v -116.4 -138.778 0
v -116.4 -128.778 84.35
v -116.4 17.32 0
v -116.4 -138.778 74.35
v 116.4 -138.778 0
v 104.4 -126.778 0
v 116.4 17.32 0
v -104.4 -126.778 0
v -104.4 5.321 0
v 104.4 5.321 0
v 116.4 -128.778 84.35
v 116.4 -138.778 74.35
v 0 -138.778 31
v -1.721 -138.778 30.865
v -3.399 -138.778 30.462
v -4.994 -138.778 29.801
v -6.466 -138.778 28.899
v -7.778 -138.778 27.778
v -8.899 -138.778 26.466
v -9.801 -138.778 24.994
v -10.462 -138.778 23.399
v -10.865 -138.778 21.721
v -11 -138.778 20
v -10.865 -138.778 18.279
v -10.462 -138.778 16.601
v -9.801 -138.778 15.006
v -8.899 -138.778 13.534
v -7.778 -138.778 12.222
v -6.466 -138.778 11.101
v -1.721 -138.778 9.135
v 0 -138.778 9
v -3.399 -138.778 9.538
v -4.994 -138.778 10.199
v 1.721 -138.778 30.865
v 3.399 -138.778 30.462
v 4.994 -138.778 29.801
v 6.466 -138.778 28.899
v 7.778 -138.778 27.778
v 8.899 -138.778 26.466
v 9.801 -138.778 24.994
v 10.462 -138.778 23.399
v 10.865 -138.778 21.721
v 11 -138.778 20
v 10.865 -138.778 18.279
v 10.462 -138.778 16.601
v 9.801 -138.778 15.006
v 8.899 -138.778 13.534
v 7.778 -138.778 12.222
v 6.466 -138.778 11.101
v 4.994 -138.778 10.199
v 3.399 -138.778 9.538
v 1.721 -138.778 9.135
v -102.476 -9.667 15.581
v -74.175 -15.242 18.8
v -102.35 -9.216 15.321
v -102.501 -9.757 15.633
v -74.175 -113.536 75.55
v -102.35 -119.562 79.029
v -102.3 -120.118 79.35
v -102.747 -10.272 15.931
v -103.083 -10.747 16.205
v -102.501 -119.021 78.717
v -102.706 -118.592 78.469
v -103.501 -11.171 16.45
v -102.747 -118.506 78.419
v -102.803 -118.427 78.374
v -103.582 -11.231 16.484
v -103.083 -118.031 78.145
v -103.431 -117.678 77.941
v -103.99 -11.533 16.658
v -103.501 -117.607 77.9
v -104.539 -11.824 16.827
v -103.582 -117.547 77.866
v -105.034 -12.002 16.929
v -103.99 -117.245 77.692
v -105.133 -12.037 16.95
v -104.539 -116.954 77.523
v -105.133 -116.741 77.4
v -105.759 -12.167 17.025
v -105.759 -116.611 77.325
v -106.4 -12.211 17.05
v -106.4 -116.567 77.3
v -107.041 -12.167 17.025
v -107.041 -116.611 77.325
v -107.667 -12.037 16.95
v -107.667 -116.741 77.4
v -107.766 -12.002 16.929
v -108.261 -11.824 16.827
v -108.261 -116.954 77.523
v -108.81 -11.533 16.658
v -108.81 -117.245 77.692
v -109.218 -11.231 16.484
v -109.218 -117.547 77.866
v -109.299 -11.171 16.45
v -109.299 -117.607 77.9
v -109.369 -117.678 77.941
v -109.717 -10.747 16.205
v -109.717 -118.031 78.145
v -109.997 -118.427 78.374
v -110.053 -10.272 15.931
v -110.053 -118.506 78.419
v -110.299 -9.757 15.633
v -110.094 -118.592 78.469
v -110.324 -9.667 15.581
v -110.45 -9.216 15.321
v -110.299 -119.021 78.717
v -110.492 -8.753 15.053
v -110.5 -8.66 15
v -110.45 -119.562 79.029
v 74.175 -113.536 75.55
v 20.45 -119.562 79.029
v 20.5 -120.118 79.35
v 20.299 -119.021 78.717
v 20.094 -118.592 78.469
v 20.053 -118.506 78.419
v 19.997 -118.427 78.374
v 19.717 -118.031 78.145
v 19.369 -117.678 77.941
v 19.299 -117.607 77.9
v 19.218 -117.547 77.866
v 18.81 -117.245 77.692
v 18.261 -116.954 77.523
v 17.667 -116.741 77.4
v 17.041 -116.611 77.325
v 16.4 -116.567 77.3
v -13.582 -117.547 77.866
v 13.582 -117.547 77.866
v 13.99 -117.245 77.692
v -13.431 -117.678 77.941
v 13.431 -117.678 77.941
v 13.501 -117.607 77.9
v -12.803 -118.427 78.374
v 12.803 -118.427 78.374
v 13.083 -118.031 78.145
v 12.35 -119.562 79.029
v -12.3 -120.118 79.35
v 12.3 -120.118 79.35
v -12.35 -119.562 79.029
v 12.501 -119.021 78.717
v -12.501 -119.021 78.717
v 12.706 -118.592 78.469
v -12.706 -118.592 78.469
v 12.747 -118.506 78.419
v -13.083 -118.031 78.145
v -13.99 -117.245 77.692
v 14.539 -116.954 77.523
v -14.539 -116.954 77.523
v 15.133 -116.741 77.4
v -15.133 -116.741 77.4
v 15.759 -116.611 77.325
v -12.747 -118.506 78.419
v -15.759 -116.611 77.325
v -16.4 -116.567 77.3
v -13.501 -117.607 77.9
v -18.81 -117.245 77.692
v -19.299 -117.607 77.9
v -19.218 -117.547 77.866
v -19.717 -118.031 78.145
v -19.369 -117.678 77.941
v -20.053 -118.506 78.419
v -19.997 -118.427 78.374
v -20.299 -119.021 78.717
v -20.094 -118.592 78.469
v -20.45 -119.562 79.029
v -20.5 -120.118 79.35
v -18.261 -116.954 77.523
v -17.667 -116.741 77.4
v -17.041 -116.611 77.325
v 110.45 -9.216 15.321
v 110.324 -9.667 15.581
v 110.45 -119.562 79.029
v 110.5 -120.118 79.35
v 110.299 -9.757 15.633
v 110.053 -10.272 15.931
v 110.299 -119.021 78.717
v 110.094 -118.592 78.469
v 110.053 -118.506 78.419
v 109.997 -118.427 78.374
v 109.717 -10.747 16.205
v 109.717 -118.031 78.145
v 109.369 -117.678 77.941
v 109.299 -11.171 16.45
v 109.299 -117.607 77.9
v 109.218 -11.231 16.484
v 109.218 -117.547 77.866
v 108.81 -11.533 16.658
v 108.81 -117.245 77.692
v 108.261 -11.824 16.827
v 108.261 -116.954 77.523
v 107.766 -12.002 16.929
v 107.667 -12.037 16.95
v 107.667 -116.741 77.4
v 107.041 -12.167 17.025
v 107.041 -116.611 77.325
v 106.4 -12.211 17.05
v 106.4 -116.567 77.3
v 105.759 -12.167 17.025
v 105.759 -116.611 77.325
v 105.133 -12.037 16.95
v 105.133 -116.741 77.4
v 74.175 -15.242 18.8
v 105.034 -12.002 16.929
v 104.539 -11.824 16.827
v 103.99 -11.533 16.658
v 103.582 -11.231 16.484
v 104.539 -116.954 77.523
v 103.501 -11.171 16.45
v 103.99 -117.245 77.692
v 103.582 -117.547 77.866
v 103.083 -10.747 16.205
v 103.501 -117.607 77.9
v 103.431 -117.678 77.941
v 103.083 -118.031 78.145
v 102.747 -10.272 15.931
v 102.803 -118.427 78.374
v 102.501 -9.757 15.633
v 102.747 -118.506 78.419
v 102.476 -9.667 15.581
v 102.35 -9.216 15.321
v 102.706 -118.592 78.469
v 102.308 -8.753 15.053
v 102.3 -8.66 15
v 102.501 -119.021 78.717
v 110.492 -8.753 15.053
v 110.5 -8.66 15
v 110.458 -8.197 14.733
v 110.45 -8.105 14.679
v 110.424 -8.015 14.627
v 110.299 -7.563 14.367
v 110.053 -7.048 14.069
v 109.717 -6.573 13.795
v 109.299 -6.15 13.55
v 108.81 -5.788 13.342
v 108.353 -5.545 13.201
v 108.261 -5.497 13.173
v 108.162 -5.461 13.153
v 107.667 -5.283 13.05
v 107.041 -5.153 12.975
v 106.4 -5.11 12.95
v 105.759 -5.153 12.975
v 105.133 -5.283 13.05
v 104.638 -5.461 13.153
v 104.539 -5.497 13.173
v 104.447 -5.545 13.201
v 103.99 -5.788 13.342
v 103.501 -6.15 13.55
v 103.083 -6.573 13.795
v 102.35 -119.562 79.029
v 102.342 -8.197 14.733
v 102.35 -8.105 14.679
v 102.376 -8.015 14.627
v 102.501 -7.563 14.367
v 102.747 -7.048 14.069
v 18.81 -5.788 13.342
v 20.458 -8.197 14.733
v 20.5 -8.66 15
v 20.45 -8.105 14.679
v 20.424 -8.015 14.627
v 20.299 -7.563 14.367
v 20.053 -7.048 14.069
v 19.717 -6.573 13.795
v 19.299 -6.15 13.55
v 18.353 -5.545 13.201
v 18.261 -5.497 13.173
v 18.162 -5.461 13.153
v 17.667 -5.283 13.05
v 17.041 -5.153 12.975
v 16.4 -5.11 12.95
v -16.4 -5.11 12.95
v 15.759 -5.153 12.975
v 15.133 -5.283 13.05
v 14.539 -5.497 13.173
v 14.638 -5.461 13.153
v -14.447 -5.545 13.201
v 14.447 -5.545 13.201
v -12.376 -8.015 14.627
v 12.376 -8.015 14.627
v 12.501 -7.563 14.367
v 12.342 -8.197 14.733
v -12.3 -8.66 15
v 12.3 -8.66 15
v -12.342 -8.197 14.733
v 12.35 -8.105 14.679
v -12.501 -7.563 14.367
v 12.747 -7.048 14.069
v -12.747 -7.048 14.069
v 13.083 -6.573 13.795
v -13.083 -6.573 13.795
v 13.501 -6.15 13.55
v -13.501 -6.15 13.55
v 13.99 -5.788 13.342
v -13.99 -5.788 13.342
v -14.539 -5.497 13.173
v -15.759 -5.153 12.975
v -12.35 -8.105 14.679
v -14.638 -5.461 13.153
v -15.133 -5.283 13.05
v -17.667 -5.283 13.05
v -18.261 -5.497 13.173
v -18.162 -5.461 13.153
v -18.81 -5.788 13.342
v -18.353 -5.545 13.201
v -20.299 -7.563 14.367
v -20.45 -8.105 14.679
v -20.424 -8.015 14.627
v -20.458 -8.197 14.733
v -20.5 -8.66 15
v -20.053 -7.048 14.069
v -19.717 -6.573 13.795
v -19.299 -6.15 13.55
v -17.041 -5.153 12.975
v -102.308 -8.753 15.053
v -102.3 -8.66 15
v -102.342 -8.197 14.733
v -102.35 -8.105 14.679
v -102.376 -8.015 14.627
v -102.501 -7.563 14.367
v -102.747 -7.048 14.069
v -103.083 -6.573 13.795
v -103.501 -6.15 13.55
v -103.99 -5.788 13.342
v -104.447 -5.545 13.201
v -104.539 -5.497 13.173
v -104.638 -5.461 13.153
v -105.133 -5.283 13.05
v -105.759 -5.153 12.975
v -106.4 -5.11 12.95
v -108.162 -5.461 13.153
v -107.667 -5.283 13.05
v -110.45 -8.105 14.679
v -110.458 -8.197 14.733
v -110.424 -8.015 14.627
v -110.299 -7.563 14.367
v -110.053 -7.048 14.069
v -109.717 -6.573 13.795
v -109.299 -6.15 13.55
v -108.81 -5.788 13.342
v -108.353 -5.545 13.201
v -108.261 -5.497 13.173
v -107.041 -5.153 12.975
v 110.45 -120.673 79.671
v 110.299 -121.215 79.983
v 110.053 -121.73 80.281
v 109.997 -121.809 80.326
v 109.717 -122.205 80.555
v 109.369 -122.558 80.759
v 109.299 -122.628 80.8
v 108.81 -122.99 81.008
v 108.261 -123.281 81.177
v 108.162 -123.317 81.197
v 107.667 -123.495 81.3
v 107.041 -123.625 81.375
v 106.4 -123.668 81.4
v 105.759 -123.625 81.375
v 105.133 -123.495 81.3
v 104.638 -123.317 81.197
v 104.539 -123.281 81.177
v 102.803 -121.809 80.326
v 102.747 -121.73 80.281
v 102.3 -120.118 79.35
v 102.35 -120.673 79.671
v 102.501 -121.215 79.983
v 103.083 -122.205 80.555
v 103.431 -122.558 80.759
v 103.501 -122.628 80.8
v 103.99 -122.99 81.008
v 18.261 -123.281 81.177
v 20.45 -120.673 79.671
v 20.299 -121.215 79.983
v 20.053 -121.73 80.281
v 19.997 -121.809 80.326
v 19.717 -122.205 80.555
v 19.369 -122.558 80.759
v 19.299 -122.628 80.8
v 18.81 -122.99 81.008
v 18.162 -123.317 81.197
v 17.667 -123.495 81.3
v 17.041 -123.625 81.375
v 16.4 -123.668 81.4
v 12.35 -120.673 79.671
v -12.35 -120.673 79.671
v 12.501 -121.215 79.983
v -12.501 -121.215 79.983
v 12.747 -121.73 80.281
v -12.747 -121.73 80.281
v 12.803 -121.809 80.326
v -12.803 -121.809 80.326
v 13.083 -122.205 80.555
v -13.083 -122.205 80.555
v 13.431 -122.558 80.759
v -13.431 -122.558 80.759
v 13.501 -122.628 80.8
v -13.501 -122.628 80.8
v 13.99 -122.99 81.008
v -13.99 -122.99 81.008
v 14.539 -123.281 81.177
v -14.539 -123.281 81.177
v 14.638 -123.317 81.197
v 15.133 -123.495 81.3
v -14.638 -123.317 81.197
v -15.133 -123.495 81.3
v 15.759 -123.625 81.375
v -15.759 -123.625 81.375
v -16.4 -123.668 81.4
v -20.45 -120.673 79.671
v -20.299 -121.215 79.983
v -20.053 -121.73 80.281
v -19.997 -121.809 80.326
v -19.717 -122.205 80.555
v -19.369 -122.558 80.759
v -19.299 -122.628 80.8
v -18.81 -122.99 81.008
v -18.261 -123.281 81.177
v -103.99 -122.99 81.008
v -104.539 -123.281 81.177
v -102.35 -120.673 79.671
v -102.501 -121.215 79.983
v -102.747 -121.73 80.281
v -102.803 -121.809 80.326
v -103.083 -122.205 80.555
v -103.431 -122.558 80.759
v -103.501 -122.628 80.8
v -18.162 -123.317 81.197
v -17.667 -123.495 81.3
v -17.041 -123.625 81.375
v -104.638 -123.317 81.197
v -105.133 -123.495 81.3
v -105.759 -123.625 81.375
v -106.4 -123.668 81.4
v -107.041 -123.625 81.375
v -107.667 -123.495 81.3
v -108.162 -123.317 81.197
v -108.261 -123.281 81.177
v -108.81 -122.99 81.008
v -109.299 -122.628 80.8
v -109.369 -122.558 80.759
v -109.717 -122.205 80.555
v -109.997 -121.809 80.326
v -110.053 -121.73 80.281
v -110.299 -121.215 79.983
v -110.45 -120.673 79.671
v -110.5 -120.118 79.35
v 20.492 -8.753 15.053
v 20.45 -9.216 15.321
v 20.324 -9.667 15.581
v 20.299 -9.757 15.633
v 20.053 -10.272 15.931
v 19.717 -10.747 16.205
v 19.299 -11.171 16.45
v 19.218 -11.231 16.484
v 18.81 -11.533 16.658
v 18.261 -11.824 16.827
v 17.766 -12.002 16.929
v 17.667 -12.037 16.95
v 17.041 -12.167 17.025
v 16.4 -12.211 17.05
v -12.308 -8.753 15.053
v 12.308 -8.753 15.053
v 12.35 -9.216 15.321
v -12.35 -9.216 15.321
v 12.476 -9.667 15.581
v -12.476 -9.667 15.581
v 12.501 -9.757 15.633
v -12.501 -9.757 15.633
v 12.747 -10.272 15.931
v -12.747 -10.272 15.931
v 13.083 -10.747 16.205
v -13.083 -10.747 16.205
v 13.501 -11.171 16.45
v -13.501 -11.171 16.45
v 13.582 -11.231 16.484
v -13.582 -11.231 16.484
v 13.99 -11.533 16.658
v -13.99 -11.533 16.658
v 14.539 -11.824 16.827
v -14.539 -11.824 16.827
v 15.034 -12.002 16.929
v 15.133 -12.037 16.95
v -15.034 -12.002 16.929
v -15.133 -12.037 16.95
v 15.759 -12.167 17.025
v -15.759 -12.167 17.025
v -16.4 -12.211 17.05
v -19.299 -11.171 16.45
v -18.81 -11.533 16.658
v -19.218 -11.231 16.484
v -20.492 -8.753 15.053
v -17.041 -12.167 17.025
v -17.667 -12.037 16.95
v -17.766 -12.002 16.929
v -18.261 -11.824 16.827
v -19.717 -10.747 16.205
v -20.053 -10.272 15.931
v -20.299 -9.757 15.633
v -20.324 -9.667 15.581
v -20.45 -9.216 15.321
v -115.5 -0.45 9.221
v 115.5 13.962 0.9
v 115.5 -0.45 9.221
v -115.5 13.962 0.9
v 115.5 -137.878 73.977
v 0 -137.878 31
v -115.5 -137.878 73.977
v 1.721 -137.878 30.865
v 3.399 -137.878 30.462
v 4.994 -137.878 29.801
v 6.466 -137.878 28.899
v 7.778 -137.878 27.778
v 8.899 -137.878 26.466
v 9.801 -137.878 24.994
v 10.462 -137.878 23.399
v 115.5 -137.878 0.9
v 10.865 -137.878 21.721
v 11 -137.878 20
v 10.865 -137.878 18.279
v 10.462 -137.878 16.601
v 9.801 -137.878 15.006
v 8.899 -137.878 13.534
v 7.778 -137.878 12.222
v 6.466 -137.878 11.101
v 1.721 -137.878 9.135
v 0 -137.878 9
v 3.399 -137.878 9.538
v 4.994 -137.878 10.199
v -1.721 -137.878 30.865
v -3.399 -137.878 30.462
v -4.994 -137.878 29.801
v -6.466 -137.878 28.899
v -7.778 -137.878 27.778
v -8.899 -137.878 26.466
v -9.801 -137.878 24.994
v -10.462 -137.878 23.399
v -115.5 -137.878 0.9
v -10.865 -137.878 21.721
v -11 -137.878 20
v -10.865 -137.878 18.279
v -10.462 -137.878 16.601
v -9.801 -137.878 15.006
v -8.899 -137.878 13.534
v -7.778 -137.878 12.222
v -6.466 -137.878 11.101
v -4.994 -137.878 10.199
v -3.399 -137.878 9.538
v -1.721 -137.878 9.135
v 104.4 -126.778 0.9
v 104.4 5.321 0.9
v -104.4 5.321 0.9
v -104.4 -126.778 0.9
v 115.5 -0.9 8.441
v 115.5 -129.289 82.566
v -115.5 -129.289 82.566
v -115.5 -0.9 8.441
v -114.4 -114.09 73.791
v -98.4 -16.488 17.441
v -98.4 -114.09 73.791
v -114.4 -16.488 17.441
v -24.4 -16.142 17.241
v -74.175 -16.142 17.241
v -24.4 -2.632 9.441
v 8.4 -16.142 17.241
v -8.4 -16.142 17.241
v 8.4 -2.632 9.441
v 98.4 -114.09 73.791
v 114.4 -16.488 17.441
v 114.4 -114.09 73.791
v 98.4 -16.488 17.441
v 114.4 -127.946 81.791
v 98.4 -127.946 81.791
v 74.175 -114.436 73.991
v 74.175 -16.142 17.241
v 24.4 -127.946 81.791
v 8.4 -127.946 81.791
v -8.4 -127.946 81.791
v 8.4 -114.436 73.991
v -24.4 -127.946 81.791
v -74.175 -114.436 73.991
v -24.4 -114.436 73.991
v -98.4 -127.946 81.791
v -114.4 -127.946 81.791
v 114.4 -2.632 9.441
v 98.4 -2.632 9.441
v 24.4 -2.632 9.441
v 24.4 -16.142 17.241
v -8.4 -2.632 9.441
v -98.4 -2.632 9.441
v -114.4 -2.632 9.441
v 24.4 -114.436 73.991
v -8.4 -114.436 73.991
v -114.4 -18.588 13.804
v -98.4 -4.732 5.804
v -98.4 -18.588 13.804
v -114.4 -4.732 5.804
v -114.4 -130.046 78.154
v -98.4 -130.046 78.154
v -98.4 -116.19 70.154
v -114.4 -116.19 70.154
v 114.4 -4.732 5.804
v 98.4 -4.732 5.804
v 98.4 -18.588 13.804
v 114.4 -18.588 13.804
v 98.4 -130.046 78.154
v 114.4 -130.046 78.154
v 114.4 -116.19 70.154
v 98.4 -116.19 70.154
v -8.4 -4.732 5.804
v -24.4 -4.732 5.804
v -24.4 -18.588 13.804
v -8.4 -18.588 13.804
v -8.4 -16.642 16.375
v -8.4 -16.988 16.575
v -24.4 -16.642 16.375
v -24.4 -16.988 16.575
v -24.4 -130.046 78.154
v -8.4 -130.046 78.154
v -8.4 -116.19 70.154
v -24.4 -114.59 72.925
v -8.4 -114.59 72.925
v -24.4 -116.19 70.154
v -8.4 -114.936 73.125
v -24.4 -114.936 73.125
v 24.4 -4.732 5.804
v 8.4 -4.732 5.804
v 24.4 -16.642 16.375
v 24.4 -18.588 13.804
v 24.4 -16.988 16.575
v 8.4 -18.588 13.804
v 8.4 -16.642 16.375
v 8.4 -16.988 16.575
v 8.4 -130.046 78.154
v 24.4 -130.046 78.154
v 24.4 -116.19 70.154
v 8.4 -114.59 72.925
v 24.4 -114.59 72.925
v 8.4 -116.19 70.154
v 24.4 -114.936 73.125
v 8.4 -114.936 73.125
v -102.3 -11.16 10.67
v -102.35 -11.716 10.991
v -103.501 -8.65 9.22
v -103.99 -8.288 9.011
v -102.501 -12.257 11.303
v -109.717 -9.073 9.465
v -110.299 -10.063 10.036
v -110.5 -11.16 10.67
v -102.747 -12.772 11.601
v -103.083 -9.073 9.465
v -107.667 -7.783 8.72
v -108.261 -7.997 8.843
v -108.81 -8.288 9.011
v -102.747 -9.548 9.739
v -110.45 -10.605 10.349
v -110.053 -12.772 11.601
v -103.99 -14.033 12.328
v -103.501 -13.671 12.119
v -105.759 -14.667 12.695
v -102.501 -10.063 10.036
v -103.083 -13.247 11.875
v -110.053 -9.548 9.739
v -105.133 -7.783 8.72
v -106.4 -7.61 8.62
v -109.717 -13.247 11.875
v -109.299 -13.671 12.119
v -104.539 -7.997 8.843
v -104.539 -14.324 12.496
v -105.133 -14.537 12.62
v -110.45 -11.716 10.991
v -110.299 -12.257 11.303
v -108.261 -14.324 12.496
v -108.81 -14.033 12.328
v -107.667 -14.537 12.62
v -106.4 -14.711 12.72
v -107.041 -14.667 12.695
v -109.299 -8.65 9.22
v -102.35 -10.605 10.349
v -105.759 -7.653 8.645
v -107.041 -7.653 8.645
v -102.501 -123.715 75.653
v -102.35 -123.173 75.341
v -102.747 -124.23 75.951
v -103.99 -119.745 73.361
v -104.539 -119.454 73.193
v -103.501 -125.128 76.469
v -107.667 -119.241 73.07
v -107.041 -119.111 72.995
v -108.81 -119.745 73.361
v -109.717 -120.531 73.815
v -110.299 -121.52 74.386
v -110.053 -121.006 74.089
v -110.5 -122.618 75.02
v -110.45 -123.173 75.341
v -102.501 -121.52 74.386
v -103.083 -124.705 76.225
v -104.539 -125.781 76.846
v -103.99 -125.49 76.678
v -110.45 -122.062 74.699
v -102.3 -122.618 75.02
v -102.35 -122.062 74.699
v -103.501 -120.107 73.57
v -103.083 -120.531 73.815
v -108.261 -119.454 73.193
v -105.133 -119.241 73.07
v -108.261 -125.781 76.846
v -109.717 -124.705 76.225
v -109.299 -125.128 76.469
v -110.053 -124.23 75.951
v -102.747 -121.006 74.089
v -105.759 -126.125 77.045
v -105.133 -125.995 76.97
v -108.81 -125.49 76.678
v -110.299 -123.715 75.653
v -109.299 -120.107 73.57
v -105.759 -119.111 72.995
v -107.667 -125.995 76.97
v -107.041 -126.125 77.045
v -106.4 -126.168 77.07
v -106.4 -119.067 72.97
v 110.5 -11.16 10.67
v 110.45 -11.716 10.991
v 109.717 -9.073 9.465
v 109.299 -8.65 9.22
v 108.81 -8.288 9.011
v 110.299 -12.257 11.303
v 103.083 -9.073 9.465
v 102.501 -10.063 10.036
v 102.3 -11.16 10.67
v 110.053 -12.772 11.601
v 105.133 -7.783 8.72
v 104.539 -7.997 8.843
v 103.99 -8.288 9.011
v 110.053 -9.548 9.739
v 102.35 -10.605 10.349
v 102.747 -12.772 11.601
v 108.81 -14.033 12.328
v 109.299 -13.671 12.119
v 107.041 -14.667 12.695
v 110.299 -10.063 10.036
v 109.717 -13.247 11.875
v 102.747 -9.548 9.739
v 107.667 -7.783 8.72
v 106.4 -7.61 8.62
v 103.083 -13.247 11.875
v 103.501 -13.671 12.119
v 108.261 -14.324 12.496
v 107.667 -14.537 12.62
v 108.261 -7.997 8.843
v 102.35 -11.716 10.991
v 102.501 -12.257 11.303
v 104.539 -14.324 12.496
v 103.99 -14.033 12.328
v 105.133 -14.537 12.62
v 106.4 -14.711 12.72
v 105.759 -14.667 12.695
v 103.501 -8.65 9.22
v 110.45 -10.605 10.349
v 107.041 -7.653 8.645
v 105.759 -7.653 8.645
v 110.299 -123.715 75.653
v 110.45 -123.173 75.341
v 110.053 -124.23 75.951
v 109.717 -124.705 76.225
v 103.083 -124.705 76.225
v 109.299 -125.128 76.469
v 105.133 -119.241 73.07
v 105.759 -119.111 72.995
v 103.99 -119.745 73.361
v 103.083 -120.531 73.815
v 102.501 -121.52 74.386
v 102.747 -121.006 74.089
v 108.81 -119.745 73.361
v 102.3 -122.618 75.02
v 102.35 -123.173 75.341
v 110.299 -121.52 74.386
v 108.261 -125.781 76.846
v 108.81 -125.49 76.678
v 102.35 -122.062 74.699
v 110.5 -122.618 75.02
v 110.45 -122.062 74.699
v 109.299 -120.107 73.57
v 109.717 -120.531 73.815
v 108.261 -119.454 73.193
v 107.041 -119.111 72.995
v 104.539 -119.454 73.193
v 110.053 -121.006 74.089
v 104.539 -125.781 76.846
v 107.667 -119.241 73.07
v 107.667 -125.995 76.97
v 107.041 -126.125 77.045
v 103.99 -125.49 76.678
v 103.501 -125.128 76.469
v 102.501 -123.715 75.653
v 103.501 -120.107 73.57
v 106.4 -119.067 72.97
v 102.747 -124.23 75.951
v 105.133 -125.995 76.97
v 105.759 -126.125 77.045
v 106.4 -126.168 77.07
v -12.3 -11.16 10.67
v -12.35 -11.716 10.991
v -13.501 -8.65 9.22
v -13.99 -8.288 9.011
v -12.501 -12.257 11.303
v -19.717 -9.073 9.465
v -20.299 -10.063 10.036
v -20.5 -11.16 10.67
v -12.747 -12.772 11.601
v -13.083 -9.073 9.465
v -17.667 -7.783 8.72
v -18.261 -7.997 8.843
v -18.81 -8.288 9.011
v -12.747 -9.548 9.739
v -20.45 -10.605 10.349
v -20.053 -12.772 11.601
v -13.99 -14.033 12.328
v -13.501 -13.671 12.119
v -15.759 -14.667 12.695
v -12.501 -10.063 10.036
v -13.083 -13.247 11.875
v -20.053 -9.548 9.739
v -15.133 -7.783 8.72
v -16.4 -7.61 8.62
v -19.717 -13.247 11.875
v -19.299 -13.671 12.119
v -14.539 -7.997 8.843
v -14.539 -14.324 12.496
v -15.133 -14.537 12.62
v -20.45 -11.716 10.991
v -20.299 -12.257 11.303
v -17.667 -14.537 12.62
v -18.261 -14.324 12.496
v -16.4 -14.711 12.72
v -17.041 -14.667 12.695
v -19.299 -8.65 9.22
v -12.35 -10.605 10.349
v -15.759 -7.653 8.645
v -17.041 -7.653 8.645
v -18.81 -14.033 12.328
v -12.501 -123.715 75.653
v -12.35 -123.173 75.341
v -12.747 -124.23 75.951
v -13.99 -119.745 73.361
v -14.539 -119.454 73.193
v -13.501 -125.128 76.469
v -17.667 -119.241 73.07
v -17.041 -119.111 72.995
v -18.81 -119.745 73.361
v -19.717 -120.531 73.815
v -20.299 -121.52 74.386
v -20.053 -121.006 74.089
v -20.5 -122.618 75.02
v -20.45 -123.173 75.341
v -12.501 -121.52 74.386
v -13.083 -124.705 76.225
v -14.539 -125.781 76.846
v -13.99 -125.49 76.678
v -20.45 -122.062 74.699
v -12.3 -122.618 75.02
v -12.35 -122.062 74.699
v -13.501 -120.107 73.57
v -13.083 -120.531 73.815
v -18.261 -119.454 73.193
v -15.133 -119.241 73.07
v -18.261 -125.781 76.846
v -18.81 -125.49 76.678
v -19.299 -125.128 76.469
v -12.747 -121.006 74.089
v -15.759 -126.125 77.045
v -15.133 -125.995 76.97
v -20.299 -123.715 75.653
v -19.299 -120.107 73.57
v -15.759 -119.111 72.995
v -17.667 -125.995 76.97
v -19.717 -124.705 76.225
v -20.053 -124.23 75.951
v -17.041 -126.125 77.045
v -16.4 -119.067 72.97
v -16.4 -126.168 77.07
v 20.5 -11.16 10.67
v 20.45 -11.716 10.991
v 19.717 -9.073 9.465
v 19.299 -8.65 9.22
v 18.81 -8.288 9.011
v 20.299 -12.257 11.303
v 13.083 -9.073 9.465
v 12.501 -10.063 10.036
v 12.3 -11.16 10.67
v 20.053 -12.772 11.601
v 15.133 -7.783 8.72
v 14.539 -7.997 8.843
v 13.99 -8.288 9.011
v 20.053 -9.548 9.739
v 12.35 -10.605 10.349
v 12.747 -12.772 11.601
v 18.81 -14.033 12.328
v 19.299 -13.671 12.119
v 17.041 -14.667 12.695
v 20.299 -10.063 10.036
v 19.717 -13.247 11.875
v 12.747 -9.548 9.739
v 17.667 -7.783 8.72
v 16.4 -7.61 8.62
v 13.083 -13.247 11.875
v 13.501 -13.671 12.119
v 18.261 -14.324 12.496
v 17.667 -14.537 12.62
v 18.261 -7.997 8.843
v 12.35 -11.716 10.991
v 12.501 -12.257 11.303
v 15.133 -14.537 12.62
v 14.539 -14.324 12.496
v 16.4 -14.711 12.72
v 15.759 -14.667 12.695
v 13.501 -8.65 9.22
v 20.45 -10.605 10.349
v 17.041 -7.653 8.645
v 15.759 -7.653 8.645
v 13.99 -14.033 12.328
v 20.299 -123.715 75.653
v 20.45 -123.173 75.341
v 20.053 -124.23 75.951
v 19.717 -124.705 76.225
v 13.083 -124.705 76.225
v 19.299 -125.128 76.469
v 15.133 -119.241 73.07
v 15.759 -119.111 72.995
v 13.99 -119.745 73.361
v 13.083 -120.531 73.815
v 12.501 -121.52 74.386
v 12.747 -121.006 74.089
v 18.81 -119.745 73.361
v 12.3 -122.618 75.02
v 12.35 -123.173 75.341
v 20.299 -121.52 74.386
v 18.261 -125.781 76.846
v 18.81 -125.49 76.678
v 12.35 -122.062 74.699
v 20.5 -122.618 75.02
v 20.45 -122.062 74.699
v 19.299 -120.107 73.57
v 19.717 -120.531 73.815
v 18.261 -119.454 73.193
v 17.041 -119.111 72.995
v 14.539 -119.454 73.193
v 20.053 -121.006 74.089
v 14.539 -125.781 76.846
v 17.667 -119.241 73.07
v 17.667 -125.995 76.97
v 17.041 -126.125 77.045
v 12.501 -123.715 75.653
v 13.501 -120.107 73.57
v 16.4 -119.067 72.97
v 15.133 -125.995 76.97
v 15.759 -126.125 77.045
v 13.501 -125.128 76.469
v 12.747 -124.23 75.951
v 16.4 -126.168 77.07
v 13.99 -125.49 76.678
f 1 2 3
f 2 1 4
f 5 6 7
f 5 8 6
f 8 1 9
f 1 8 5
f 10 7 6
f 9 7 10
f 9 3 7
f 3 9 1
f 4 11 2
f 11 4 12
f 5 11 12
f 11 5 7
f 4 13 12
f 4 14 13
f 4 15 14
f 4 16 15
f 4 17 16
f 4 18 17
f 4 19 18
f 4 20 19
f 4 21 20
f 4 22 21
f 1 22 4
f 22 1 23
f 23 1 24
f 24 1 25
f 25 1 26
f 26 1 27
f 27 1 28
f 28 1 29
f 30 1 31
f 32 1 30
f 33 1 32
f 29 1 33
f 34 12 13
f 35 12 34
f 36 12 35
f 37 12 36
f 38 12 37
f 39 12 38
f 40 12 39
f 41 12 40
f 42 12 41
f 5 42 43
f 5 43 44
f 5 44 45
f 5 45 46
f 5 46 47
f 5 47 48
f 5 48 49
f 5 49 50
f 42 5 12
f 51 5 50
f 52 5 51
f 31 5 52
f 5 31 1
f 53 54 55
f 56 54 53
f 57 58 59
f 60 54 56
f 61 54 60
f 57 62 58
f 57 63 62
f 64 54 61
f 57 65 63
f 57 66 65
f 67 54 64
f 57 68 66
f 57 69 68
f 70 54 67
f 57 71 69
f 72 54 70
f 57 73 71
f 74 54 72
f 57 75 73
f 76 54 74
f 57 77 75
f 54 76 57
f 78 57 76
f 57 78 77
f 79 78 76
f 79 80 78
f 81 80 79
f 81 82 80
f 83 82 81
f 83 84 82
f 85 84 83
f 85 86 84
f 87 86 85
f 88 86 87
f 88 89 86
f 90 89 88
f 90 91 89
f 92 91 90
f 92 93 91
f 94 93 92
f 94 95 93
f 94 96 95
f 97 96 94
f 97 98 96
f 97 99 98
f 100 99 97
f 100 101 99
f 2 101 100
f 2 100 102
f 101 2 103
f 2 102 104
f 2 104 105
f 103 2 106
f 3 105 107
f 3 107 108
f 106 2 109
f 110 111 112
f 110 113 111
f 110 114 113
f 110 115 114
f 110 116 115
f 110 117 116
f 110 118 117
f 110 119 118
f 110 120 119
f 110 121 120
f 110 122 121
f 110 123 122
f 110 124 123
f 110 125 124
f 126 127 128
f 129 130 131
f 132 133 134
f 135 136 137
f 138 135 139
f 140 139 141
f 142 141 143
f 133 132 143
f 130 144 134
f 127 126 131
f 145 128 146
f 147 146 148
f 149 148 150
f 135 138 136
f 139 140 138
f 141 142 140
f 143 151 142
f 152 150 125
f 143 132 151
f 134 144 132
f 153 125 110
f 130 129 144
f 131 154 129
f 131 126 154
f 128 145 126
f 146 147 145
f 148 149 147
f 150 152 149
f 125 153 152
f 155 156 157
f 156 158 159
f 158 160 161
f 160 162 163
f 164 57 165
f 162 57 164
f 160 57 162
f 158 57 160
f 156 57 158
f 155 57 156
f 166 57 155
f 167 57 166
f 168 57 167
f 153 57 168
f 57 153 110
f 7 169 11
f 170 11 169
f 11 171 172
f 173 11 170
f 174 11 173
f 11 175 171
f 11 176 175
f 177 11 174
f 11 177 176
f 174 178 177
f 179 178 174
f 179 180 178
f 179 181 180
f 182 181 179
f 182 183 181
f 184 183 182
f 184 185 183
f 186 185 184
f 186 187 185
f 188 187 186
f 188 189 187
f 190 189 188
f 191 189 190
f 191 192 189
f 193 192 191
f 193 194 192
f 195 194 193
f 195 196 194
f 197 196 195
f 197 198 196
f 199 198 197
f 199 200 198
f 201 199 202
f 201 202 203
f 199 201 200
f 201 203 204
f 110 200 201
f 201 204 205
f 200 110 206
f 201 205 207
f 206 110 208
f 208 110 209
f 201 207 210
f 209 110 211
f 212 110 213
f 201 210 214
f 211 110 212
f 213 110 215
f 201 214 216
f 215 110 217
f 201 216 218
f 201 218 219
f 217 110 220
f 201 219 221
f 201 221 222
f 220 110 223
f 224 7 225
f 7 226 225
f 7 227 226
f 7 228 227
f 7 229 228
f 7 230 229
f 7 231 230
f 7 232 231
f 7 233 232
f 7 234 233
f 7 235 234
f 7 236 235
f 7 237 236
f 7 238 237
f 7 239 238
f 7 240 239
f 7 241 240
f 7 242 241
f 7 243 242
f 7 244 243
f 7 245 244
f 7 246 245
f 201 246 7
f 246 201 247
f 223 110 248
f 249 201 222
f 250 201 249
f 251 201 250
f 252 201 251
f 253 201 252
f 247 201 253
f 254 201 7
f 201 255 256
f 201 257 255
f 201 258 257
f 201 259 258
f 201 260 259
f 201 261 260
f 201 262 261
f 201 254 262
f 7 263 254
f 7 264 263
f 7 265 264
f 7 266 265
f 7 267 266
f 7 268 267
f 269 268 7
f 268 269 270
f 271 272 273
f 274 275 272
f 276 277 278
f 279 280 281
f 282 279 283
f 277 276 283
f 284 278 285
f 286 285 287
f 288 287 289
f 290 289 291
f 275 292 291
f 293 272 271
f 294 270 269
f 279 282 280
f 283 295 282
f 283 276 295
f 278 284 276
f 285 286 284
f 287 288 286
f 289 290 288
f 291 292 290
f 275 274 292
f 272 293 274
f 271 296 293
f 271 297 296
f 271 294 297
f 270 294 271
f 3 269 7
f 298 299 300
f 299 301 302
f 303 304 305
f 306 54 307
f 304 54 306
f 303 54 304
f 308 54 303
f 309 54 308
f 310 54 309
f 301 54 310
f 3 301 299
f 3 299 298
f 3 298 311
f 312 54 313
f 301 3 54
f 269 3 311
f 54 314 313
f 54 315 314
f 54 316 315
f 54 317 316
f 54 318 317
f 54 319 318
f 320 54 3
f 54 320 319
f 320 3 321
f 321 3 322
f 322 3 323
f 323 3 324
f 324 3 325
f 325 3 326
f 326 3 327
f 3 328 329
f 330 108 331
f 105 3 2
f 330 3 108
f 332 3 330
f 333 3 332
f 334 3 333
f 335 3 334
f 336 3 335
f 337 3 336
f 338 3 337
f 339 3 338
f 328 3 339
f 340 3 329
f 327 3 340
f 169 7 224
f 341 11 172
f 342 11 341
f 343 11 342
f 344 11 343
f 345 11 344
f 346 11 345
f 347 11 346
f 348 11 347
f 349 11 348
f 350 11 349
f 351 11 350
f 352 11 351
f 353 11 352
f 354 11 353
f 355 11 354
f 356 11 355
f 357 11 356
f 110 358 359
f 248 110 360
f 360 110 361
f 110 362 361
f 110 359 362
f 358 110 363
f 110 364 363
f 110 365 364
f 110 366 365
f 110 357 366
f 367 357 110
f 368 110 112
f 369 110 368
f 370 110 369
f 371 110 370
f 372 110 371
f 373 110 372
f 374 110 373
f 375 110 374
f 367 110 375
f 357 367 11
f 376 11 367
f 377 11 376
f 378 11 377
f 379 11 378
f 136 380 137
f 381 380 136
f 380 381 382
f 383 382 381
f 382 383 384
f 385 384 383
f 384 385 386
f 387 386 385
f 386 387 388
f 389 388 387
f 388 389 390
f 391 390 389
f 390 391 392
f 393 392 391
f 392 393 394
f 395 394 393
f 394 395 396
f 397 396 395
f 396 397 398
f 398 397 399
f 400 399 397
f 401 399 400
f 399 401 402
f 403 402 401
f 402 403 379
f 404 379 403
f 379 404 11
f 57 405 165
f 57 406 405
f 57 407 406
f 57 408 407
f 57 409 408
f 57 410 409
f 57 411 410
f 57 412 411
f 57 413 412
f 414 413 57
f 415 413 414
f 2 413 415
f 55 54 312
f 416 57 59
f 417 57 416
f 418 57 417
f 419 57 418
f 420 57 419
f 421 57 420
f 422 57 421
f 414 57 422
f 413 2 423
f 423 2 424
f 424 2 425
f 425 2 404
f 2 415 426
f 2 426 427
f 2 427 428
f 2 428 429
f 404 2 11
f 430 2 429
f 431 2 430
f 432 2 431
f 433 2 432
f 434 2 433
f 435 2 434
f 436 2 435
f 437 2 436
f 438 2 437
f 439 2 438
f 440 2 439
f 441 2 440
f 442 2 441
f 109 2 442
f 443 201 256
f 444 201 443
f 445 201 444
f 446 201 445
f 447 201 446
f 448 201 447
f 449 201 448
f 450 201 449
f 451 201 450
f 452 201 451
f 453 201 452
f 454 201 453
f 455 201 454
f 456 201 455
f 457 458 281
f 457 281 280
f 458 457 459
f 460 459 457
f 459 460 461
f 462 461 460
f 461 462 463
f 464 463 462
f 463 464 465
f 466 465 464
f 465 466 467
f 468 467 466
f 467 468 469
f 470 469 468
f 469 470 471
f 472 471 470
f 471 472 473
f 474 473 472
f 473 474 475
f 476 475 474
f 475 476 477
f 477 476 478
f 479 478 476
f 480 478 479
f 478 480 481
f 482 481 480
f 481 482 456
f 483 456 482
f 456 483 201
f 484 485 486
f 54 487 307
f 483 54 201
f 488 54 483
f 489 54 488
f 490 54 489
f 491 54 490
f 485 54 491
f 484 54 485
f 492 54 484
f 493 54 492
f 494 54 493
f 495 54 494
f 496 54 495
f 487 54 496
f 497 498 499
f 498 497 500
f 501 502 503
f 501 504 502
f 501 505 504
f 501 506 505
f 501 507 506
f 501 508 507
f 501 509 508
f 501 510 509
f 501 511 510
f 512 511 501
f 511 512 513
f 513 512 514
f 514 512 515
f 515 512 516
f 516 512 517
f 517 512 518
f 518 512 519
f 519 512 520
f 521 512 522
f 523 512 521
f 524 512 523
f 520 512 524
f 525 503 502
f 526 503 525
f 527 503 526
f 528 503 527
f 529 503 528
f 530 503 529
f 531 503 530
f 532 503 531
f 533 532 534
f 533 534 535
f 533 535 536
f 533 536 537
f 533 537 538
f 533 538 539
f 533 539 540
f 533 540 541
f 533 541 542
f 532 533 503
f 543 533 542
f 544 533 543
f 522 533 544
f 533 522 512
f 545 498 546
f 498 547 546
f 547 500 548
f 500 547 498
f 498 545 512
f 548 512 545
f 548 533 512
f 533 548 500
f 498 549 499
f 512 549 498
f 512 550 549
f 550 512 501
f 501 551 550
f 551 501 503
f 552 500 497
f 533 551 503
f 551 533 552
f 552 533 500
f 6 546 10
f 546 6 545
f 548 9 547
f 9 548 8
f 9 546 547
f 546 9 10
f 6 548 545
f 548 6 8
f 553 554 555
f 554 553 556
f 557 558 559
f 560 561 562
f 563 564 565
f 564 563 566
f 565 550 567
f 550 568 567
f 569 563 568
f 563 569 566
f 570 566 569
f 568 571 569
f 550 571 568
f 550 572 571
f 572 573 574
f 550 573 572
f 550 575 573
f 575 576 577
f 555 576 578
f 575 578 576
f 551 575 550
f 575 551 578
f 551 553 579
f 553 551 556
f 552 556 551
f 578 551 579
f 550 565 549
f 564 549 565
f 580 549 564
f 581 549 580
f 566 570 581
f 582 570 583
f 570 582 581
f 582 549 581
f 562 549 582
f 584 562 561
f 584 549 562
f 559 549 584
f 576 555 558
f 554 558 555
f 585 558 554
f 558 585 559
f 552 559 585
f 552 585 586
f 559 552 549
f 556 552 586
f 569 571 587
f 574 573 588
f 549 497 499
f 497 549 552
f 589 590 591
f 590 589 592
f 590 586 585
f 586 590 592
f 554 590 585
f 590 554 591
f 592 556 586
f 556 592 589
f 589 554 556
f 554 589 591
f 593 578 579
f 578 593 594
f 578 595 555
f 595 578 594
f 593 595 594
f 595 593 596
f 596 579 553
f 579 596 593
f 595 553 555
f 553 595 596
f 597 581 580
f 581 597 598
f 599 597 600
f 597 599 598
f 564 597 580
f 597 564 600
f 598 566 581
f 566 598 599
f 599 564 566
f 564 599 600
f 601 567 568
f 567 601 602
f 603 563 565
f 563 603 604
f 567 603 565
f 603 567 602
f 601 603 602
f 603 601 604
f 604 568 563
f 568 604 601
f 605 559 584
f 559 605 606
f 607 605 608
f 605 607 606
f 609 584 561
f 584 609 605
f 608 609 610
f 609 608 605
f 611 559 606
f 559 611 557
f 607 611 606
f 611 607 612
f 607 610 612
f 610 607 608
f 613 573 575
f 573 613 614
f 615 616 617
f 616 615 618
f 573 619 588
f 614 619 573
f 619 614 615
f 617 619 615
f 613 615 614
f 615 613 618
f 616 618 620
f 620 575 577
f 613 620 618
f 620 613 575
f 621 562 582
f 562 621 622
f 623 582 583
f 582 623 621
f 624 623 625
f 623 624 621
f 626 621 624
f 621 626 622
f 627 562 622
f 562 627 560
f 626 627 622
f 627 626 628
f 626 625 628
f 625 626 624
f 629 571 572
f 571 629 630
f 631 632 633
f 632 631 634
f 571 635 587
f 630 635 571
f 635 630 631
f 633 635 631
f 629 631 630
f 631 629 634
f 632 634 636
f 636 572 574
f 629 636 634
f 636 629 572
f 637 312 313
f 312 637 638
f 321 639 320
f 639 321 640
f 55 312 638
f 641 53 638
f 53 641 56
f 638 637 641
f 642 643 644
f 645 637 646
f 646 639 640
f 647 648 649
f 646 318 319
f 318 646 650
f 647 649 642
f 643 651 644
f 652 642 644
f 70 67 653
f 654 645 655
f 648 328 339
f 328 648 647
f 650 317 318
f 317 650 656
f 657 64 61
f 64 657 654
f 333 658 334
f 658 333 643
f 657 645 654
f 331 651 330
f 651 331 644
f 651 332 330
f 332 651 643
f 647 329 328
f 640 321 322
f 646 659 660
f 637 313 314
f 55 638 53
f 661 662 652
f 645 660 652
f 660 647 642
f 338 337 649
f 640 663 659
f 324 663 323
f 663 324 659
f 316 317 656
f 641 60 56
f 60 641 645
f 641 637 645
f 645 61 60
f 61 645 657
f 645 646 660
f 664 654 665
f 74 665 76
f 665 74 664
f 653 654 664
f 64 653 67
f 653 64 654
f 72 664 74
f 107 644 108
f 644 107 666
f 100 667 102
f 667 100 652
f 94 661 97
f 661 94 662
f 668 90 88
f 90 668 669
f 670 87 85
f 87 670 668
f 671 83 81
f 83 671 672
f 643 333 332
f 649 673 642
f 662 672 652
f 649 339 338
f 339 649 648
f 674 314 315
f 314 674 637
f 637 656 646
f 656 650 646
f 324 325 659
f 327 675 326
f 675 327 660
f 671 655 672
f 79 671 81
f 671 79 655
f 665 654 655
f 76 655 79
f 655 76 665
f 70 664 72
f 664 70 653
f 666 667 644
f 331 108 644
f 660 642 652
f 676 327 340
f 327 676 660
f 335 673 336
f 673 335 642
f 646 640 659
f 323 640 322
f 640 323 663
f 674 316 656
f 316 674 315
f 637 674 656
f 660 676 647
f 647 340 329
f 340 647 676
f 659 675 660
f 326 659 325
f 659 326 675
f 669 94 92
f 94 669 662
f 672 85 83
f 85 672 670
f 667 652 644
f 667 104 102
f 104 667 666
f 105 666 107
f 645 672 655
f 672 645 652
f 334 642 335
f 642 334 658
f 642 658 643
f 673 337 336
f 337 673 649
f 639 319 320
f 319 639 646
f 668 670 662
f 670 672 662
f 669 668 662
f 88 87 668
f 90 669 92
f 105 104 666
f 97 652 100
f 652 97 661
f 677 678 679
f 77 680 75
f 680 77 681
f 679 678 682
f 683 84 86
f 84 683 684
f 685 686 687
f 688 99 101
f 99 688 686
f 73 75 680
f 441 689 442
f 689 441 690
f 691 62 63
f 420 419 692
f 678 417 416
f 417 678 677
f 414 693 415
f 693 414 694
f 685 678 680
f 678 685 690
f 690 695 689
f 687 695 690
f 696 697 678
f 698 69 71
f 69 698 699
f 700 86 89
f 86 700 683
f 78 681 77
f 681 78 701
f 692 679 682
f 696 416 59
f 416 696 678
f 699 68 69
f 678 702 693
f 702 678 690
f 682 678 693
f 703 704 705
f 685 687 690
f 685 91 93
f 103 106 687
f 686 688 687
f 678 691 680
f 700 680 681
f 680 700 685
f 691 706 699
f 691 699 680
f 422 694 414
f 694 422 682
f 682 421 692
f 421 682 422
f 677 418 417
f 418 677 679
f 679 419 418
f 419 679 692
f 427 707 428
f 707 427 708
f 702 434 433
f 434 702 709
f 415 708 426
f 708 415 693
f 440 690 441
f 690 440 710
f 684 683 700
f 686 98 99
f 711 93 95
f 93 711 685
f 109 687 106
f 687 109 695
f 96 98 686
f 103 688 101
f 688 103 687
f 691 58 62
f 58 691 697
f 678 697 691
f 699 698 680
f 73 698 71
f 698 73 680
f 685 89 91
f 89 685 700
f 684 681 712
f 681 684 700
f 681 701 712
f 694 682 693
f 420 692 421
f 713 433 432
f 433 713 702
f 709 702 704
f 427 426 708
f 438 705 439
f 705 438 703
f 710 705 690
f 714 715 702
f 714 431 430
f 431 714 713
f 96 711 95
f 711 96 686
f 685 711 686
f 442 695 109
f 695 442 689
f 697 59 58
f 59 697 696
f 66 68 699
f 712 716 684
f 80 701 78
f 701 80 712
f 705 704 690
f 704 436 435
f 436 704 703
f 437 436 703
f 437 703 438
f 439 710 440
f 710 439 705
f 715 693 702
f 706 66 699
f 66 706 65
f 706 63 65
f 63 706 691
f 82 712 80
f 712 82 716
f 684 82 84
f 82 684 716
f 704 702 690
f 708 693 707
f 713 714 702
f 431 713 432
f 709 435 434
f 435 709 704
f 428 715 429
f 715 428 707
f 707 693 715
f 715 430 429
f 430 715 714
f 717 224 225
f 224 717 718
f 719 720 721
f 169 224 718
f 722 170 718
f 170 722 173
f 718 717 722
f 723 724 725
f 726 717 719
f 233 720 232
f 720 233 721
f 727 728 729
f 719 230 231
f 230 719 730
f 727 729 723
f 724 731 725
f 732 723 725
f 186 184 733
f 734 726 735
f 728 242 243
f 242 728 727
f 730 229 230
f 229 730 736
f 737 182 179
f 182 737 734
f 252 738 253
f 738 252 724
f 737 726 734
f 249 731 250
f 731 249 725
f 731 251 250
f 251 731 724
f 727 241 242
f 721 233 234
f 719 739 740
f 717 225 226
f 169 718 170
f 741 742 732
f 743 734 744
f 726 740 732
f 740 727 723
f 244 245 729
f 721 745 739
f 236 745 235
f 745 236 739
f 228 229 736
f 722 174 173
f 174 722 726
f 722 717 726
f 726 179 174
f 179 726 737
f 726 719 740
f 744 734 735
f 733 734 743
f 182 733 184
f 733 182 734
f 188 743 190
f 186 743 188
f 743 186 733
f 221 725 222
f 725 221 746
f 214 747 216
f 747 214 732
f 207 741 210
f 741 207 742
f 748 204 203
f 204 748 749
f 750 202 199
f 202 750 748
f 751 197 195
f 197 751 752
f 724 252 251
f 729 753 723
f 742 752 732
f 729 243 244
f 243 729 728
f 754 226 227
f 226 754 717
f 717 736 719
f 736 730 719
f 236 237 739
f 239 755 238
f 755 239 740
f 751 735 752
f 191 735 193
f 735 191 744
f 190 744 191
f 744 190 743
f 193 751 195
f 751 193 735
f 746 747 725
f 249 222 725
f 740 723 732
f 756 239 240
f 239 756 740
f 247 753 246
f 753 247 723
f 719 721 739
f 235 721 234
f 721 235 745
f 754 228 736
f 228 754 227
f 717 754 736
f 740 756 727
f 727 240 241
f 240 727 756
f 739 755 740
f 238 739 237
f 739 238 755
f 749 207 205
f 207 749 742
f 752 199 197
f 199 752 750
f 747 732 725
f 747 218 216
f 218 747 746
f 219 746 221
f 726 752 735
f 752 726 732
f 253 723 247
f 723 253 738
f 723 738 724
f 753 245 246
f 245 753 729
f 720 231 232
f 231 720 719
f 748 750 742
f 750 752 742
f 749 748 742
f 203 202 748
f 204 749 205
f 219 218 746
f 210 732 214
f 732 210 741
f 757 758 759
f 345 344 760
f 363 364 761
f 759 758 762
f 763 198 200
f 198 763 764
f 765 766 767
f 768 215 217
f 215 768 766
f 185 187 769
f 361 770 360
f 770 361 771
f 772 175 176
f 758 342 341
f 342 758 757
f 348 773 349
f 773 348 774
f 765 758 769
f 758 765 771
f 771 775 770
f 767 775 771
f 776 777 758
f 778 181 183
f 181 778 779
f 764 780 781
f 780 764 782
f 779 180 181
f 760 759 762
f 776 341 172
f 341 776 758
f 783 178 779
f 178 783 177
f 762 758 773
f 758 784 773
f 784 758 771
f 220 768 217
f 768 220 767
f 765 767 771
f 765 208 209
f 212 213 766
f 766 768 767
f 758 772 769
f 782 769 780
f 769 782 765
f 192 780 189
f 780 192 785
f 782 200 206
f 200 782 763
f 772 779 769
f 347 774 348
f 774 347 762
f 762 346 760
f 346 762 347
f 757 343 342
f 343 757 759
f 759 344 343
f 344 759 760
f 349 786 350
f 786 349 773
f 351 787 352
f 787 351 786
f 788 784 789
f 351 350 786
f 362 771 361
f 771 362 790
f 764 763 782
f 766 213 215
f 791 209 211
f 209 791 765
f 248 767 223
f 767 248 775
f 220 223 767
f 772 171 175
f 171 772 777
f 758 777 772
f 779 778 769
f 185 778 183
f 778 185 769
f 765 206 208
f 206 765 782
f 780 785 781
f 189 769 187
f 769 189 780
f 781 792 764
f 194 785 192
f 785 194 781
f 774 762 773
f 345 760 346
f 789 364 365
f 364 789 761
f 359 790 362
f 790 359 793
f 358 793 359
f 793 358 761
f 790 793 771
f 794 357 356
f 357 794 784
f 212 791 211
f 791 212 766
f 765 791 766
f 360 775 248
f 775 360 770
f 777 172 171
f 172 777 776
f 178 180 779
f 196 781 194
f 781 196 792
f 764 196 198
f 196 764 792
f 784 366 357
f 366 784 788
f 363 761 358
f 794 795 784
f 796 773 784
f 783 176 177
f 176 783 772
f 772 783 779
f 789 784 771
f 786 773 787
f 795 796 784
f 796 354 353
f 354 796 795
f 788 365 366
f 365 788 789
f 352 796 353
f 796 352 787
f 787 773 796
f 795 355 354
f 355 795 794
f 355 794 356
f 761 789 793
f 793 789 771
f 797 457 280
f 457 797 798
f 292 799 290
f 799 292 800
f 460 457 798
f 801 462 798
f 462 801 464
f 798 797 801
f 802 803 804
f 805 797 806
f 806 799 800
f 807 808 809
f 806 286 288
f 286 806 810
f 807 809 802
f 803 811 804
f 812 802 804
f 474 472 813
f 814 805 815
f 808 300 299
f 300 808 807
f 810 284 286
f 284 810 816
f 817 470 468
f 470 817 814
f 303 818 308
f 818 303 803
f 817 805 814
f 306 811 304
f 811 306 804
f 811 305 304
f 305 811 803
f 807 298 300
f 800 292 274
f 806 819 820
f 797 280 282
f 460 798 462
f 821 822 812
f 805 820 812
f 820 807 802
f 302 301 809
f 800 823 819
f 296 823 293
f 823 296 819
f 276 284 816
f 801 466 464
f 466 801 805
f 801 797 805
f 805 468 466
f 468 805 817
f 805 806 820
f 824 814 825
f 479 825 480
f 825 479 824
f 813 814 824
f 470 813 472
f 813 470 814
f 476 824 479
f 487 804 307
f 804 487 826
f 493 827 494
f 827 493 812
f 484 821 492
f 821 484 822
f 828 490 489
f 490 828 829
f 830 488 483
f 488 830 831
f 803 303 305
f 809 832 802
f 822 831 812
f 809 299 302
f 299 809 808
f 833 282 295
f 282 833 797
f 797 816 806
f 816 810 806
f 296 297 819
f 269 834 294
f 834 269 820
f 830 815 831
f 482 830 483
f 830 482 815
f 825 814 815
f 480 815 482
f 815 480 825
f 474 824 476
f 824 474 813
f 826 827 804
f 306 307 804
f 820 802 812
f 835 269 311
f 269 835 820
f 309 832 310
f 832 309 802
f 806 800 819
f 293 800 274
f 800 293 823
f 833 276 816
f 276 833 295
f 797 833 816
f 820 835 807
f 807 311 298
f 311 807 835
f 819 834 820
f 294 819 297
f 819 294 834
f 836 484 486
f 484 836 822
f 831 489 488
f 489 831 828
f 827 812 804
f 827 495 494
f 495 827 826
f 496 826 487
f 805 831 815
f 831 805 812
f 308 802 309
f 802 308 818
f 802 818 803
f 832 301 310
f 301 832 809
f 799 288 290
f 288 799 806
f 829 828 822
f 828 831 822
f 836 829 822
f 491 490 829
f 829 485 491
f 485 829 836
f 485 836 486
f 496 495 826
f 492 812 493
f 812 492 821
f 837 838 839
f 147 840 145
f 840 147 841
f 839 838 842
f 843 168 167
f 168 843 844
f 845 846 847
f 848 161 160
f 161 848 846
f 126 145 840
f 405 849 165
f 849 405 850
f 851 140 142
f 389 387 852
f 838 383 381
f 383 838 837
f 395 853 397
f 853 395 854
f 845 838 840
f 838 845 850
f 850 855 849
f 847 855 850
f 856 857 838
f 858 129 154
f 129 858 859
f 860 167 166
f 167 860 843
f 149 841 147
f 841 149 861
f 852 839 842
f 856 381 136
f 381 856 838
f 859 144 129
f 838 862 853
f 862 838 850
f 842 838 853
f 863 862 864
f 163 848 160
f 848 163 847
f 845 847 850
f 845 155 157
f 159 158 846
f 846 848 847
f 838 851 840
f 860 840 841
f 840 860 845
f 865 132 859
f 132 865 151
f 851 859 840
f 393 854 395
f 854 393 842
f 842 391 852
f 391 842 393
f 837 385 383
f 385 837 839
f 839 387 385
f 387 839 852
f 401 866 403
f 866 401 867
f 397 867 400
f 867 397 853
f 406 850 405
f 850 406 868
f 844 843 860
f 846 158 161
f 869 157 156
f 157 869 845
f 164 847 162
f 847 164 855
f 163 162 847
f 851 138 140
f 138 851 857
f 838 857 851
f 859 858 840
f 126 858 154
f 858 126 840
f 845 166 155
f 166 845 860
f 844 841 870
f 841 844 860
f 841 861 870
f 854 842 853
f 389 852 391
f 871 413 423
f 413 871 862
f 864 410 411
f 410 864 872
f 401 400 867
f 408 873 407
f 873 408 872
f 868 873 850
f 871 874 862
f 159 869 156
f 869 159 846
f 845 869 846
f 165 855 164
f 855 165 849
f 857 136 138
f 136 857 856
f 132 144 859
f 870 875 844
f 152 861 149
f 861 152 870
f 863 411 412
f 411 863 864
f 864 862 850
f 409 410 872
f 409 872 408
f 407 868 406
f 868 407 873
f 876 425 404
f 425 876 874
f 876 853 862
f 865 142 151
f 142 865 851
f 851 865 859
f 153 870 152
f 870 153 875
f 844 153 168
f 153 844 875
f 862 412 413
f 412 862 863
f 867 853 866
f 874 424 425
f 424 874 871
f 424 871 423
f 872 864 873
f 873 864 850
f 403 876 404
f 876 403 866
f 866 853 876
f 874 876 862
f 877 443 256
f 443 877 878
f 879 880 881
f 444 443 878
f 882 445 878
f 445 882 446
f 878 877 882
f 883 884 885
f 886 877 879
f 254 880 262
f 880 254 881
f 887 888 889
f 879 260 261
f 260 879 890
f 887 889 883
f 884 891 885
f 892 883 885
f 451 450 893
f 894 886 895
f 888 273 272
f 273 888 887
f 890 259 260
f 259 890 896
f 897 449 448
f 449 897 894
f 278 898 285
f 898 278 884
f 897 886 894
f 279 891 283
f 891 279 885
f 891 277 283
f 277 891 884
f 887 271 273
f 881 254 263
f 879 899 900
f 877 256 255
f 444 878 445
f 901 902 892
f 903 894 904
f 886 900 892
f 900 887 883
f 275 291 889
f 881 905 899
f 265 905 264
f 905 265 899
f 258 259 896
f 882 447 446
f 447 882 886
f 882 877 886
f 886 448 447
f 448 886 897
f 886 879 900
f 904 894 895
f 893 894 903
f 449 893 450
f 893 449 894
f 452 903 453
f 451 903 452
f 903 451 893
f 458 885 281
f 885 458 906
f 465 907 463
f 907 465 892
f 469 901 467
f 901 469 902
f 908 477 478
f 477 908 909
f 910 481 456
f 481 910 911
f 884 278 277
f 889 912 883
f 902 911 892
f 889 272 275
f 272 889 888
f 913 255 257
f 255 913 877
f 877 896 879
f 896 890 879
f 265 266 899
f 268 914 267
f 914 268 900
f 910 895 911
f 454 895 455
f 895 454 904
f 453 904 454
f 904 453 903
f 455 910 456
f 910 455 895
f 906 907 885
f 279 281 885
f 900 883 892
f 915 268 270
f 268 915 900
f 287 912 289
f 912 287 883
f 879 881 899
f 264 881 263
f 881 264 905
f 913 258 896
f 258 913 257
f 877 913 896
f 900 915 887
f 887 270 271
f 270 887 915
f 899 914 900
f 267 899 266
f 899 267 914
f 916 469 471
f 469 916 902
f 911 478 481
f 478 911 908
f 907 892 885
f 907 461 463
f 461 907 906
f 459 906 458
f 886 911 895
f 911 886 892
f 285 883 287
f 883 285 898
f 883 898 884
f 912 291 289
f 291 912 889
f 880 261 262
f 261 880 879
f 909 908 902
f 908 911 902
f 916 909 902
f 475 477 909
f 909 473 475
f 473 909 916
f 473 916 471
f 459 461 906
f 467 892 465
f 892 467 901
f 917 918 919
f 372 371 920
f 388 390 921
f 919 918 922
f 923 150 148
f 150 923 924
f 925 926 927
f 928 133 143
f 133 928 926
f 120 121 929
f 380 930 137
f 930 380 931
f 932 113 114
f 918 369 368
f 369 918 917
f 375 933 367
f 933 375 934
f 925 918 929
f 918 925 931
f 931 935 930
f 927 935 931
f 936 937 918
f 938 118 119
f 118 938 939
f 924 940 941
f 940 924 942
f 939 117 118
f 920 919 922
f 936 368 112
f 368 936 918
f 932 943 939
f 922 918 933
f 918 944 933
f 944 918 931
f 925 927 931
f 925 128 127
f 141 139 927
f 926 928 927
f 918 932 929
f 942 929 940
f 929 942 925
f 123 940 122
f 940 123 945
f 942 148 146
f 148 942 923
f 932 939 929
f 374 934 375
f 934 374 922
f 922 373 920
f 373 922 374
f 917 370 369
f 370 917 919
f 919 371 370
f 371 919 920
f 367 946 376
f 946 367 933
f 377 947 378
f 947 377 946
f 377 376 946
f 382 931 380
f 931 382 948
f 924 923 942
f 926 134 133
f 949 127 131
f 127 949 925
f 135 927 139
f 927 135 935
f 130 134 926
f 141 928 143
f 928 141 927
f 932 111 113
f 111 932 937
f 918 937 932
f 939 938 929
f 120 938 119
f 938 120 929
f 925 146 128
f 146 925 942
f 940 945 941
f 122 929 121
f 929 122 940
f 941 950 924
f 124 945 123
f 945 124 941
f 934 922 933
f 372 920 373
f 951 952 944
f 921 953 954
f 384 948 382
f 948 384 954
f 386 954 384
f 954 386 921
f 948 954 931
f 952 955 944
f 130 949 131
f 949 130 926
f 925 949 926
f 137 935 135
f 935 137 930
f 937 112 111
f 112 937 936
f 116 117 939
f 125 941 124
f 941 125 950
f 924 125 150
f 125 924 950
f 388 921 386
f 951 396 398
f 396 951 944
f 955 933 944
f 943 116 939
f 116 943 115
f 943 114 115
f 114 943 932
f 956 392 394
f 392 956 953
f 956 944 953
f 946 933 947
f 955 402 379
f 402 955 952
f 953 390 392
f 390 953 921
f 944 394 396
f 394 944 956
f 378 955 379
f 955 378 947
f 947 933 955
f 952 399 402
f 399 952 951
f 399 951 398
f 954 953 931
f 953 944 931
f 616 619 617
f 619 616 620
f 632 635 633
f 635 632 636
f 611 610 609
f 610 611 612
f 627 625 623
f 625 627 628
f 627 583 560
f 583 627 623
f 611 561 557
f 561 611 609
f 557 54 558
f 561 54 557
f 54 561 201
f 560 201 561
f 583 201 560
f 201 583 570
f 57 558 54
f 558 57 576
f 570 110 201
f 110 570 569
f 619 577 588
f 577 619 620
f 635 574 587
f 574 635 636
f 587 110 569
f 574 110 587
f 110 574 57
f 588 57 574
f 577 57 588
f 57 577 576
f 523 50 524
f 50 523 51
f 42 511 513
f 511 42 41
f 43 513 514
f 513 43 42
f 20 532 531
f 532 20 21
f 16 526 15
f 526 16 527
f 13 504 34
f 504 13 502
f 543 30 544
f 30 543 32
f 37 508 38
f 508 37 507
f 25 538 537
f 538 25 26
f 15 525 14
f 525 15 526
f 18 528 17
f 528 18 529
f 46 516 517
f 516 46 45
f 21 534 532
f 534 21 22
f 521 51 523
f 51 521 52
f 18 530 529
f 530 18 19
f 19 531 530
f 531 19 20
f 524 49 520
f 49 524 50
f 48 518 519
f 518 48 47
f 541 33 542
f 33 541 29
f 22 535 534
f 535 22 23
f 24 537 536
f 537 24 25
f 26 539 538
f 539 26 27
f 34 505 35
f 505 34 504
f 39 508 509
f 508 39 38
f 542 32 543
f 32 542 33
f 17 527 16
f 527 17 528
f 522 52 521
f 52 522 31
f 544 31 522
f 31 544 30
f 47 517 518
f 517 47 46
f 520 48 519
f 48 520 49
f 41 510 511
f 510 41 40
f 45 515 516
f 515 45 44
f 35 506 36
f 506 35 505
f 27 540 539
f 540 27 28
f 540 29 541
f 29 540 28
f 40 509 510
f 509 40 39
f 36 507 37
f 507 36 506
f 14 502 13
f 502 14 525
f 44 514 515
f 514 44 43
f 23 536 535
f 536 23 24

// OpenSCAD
// file: suporte_tela10_fino.scad
// =====================================================================
//  Suporte FECHADO FINO (impressão rápida) para a tela Guition
//  JC8012P4A1C 10,1". Mesmo encaixe do suporte_tela10.scad, mas:
//    - paredes de 1,6 mm (4 linhas de bico 0,4);
//    - sem logo;
//    - sem a borda grossa: só uma pastilha em volta de cada encaixe;
//    - fundo vazado (só uma moldura apoiando na mesa).
//  A tela apoia na face e as colunas de latão entram nos encaixes:
//  fica presa pelo peso, sem parafuso.
//  Eixos: X = largura, Y = profundidade (+Y para a frente), Z para cima.
// =====================================================================

/* [Tela (desenho Guition)] */
tela_l      = 242.8;
tela_a      = 158.7;
furo_borda  = 15;
furo_meio   = 16.4;
caixa_l     = 138.35;
caixa_a     = 93.5;

/* [Suporte] */
angulo      = 50;       // inclinação da tela em relação à mesa (mínimo 45 para imprimir sem suporte)
recuo_face  = 5;
parede      = 0.9;      // laterais, traseira e fundo (2 linhas de bico 0,4)
esp_face    = 1.8;      // face onde a tela apoia (mais grossa)
altura_frente = 10;
fundo_atras = 12;
moldura_fundo = 12;     // largura da moldura do fundo (o meio é vazado)
encaixe_d   = 8.2;
encaixe_prof = 5;
pastilha    = 16;       // pastilha em volta de cada encaixe
margem_l    = 5;
margem_a    = 10;
encaixes_dos_dois_lados = true;
furo_tras_d = 22;
furo_tras_z = 20;

$fn = 40;
e = 0.01;

W  = tela_l - 2*recuo_face;
L  = tela_a - 2*recuo_face;
ca = cos(angulo); sa = sin(angulo);
v2s = function(v) v + L/2;
z_topo = altura_frente + L*sa;
y_topo = -L*ca;
y_tras = y_topo - fundo_atras;
z_tras = z_topo - fundo_atras;
bico_frente = altura_frente * ca / sa;
abre_u = caixa_l/2 + margem_l;
abre_v = caixa_a/2 + margem_a;
k45 = max(0, tan(angulo - 45));      // recuo por mm de profundidade p/ ficar a 45°

fu = tela_l/2 - furo_borda;
fv = tela_a/2 - furo_borda;
encaixes = concat(
    [for (su = [-1, 1], sv = [-1, 1]) [su*fu, sv*fv]],
    [for (sv = [-1, 1]) [-furo_meio, sv*fv]],
    encaixes_dos_dois_lados ? [for (sv = [-1, 1]) [furo_meio, sv*fv]] : []
);

echo(str("Suporte fino: ", W, " x ", round(bico_frente - y_tras), " x ", round(z_topo), " mm"));

module na_face() {
    multmatrix([[1, 0,   0,  0],
                [0, -ca, sa, 0],
                [0, sa,  ca, altura_frente],
                [0, 0,   0,  1]]) children();
}

module perfil() {
    polygon([[bico_frente, 0], [0, altura_frente], [y_topo, z_topo],
             [y_tras, z_tras], [y_tras, 0]]);
}

module casca() {
    difference() {
        translate([-W/2, 0, 0]) rotate([90, 0, 90]) linear_extrude(W) perfil();
        translate([-W/2 + parede, 0, 0]) rotate([90, 0, 90]) linear_extrude(W - 2*parede)
            offset(delta = -parede) perfil();
        // fundo vazado: fica só a moldura
        translate([-W/2 + moldura_fundo, y_tras + moldura_fundo, -1])
            cube([W - 2*moldura_fundo, bico_frente - y_tras - 2*moldura_fundo, parede + 2]);
    }
}

// pastilha atrás da face, com a borda de baixo a 45° (imprime sem suporte)
module pastilha_em(u, v) {
    s0 = v2s(v) - pastilha/2;  s1 = v2s(v) + pastilha/2;
    p = encaixe_prof + 1;
    intersection() {
        hull() {
            na_face() translate([u - pastilha/2, s0, -e]) cube([pastilha, s1 - s0, e]);
            na_face() translate([u - pastilha/2, s0 - p*k45, -p]) cube([pastilha, s1 - s0 + p*k45, e]);
        }
        translate([-W/2, 0, 0]) rotate([90, 0, 90]) linear_extrude(W) perfil();
    }
}

module suporte() {
    difference() {
        union() {
            casca();
            // face mais grossa que as outras paredes
            intersection() {
                translate([-W/2, 0, 0]) rotate([90, 0, 90]) linear_extrude(W) perfil();
                na_face() translate([-W/2, 0, -esp_face]) cube([W, L, esp_face]);
            }
            for (f = encaixes) pastilha_em(f[0], f[1]);
        }
        // abertura da caixa: borda de cima a 45°
        hull() {
            na_face() translate([-abre_u, v2s(-abre_v), 0]) cube([2*abre_u, 2*abre_v, 1]);
            na_face() translate([-abre_u, v2s(-abre_v), -esp_face - 1])
                cube([2*abre_u, 2*abre_v - (esp_face + 1) * k45, e]);
        }
        // encaixes das colunas de latão
        for (f = encaixes) na_face() translate([f[0], v2s(f[1]), -encaixe_prof]) cylinder(d = encaixe_d, h = encaixe_prof + 1);
        // furo do cabo atrás
        translate([0, y_tras + parede/2, furo_tras_z]) rotate([90, 0, 0]) cylinder(d = furo_tras_d, h = parede + 2, center = true);
    }
}

suporte();
// main file
// =====================================================================
//  Suporte de MESA pequeno e bem deitado para a tela Guition 10,1".
//  É o suporte_tela10_fino.scad com outros valores:
//    - tela a 30° da mesa (60° para trás da vertical), ~8 cm de altura;
//    - paredes finas (0,9 mm) e face de 1,8 mm, sem logo: impressão rápida;
//    - o STL sai GIRADO, com a traseira na mesa da impressora: a face fica
//      a 30° da vertical e imprime SEM SUPORTE. Não gire no fatiador.
// =====================================================================
include <suporte_tela10_fino.scad>

angulo      = 30;
fundo_atras = 10;
imprimir_de_costas = true;
janelas_fundo = 3;
